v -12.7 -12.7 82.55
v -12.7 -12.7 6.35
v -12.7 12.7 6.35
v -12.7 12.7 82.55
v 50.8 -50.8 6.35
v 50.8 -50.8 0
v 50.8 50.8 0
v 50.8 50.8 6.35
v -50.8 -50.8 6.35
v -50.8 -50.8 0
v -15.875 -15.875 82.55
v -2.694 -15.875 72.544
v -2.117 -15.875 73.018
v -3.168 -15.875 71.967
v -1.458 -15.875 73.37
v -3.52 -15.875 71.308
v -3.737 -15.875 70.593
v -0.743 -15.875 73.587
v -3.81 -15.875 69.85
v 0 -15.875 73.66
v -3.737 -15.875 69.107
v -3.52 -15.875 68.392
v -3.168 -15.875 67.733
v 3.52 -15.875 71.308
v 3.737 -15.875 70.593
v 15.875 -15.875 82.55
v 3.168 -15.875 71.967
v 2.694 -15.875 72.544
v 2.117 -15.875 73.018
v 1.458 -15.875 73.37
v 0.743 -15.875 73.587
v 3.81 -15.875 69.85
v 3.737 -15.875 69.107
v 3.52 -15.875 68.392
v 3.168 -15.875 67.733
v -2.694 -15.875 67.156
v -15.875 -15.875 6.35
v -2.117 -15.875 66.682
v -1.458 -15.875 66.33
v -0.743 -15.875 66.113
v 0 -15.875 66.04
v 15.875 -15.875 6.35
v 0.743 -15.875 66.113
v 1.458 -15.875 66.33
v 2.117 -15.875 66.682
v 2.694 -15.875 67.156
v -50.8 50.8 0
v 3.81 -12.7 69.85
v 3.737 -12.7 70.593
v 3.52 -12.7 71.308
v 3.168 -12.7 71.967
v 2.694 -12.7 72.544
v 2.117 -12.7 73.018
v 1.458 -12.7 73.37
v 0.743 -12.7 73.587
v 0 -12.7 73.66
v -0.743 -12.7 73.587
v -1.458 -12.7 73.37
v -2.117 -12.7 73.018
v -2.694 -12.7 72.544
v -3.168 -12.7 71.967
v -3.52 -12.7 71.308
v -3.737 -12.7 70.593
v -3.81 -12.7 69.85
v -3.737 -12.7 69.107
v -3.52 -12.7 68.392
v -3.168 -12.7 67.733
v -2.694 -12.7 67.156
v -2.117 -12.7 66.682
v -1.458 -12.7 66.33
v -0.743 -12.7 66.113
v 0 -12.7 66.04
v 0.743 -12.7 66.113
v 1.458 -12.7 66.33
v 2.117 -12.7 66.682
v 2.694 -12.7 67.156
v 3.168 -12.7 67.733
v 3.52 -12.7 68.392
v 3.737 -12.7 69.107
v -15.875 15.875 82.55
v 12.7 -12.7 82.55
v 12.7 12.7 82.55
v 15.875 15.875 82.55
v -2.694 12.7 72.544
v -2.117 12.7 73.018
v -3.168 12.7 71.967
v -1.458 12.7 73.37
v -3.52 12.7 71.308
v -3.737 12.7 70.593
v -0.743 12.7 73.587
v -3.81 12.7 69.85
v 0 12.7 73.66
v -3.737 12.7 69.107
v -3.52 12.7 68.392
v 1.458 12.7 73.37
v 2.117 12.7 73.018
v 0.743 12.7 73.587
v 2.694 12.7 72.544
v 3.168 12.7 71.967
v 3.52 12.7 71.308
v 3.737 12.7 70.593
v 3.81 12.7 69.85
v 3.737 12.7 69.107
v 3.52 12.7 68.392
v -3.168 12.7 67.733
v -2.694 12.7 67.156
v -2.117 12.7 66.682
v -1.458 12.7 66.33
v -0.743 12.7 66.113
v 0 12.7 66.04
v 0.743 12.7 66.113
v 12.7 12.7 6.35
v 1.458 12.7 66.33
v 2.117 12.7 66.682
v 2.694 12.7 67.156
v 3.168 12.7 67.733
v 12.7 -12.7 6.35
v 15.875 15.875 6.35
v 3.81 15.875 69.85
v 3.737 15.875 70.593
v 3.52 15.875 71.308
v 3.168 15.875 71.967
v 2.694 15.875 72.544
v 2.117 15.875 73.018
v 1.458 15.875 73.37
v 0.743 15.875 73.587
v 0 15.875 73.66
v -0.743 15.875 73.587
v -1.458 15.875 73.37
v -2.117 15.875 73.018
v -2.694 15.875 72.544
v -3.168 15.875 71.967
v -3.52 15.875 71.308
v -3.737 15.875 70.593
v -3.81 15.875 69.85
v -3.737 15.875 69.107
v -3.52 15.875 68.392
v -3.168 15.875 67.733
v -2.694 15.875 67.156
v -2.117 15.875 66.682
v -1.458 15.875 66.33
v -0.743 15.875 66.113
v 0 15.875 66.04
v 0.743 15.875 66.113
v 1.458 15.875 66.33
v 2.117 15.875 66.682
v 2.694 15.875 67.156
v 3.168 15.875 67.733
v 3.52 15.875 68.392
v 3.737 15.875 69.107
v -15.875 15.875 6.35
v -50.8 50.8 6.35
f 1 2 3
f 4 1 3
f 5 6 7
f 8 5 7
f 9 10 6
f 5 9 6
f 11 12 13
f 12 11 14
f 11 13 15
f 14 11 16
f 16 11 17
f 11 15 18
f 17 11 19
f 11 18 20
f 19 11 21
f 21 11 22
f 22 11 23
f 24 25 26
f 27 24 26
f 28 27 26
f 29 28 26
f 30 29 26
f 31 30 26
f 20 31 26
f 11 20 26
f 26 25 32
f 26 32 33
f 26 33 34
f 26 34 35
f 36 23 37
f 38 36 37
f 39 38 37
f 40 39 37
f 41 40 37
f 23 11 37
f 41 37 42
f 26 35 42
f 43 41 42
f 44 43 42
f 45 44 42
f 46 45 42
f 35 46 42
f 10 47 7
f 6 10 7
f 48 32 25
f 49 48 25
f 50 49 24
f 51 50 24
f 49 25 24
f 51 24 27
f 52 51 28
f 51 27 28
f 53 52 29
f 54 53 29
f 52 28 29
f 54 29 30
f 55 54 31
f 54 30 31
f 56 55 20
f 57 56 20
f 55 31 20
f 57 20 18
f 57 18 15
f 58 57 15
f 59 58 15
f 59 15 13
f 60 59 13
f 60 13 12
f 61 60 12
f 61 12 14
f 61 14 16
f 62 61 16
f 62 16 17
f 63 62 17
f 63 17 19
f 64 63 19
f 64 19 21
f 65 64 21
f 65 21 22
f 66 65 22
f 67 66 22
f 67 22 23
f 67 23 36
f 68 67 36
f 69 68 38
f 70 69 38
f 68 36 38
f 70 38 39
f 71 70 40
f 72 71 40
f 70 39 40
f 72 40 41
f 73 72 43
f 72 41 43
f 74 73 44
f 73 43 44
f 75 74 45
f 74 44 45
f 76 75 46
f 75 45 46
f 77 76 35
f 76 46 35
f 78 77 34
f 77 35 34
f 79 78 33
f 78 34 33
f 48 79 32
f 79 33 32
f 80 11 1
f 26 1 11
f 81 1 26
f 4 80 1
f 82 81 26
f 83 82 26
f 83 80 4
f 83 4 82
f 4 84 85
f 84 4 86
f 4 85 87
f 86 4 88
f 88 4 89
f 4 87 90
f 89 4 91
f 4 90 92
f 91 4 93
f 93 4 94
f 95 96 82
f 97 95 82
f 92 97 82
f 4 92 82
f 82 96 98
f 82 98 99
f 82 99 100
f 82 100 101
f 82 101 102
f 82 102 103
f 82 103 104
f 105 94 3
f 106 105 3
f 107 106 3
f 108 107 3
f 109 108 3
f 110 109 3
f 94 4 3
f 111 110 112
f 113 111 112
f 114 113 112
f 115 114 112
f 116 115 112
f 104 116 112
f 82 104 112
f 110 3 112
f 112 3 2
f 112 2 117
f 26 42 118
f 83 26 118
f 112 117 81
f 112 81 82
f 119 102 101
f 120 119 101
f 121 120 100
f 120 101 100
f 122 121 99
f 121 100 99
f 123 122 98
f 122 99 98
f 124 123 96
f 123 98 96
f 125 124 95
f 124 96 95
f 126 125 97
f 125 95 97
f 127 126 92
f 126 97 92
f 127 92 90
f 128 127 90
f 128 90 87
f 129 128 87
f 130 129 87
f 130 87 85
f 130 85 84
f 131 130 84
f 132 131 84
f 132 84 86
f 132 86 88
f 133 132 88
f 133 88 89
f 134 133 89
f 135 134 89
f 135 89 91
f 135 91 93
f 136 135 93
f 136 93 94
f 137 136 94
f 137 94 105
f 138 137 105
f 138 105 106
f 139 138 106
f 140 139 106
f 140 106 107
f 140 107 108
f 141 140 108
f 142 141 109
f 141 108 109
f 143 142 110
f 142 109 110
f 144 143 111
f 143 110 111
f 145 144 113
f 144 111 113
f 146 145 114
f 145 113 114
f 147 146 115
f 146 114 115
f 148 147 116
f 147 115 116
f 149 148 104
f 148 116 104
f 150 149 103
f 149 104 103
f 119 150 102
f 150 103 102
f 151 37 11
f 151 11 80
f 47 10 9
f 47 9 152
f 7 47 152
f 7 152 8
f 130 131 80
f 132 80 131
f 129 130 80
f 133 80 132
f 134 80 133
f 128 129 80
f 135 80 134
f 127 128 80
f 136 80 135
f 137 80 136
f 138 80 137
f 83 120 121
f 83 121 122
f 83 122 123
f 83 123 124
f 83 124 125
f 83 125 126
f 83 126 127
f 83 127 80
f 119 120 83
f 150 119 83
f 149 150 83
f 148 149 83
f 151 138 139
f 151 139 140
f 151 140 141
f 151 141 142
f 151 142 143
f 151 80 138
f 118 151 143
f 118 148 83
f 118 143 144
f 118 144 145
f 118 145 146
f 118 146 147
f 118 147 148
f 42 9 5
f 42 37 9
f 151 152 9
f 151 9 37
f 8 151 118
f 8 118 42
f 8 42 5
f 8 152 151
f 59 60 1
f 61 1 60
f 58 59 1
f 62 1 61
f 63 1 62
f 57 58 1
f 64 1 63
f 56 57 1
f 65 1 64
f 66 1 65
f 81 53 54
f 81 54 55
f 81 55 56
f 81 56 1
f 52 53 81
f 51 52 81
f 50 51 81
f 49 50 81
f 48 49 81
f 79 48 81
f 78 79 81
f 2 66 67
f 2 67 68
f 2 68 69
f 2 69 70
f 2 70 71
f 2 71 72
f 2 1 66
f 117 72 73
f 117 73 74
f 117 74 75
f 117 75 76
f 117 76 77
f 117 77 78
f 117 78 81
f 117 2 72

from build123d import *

# Parameters (mm, degrees)
F0_W     = 101.6
F0_H     = 101.6
F1_DEPTH = 6.35
F2_W     = 31.75
F2_H     = 31.75
F2_W_2   = 25.4
F2_H_2   = 25.4
F3_DEPTH = 76.2
F4_R     = 3.81
F5_DEPTH = 66.676


with BuildPart() as f1:
    # F0 (on Top) → F1 (new body)
    with BuildSketch(Plane.XY):
        Rectangle(F0_W, F0_H)
    extrude(amount=F1_DEPTH)

    # F2 (on face) → F3 (join)
    with BuildSketch(Plane.XY.offset(6.35)):
        Rectangle(F2_W, F2_H)
        Rectangle(F2_W_2, F2_H_2, mode=Mode.SUBTRACT)
    extrude(amount=F3_DEPTH)

    # F4 (on face) → F5 (cut, through all)
    with BuildSketch(Plane.XZ.offset(15.875)):
        with Locations((0, 69.85)):
            Circle(F4_R)
    extrude(amount=-F5_DEPTH, mode=Mode.SUBTRACT)


solid = f1.part
